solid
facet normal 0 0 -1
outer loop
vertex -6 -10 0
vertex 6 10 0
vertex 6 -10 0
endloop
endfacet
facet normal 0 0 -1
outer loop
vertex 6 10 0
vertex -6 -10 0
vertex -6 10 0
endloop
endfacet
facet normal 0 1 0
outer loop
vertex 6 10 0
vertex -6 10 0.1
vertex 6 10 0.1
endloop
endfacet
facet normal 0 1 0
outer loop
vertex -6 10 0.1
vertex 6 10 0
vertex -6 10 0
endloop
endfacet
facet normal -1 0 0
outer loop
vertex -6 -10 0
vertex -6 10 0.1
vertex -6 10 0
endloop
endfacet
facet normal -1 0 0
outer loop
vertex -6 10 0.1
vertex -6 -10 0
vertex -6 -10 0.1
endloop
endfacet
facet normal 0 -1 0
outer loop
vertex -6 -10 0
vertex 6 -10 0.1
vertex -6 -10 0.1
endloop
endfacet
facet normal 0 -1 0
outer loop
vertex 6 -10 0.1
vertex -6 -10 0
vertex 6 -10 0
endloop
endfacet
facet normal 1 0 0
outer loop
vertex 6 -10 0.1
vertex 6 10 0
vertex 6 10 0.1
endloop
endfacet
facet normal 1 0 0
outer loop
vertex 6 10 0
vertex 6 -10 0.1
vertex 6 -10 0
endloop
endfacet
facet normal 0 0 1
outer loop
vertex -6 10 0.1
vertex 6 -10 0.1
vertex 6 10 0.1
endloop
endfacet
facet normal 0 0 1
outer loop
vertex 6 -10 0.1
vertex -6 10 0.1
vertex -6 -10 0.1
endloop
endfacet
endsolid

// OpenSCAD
// file: ../p/box5-12.scad
use <../lib.scad>
function ldraw_lib__box5_12() = [
// 0 Box with 5 Faces without Any Edges
// 0 Name: box5-12.dat
// 0 Author: Chris Dee [cwdee]
// 0 !LDRAW_ORG Primitive UPDATE 2009-02
// 0 !LICENSE Licensed under CC BY 4.0 : see CAreadme.txt
// 
// 0 BFC CERTIFY CCW
  [0,"BFC","CERTIFY"],
  [0,"BFC","CCW"],
// 
// 0 !HISTORY 2009-09-03 [PTadmin] Official Update 2009-02
// 
// 
// 4 16 1 1 1 1 1 -1 -1 1 -1 -1 1 1
  [4,16,1,1,1,1,1,-1,-1,1,-1,-1,1,1],
// 4 16 -1 0 1 1 0 1 1 1 1 -1 1 1
  [4,16,-1,0,1,1,0,1,1,1,1,-1,1,1],
// 4 16 -1 0 -1 -1 0 1 -1 1 1 -1 1 -1
  [4,16,-1,0,-1,-1,0,1,-1,1,1,-1,1,-1],
// 4 16 1 0 -1 -1 0 -1 -1 1 -1 1 1 -1
  [4,16,1,0,-1,-1,0,-1,-1,1,-1,1,1,-1],
// 4 16 1 0 1 1 0 -1 1 1 -1 1 1 1
  [4,16,1,0,1,1,0,-1,1,1,-1,1,1,1],
// 0
];
module ldraw_lib__box5_12(step=0, col=false, unit=2/5, alt=false, line=0.2, solid=!$preview)
    makepoly(ldraw_lib__box5_12(), step=step, col=col, unit=unit, alt=alt, line=line, solid=solid);
ldraw_lib__box5_12(line=0.2);
// main file
use <../lib.scad>
use <../p/box5-12.scad>
function ldraw_lib__4650854h() = [
// 0 Sticker  2.5 x  1.5 with Chrome Silver Mirror
// 0 Name: 4650854h.dat
// 0 Author: Takeshi Takahashi [RainbowDolphin]
// 0 !LDRAW_ORG Part UPDATE 2024-08
// 0 !LICENSE Licensed under CC BY 4.0 : see CAreadme.txt
// 
// 0 BFC CERTIFY CCW
  [0,"BFC","CERTIFY"],
  [0,"BFC","CCW"],
// 
// 0 !KEYWORDS Bricklink 3185stk01, Brickowl 384632, camp, Rebrickable 10099435
// 0 !KEYWORDS Riding, Set 3185, Stable
// 
// 0 !HISTORY 2024-09-30 [OrionP] Official Update 2024-08
// 
// 
// 1 16 0 -0.25 0 15 0 0 0 0.25 0 0 0 25 box5-12.dat
  [1,16,0,-0.25,0,15,0,0,0,0.25,0,0,0,25, ldraw_lib__box5_12()],
// 
// 4 383 15 -0.25 25 -15 -0.25 25 -15 -0.25 -25 15 -0.25 -25
  [4,383,15,-0.25,25,-15,-0.25,25,-15,-0.25,-25,15,-0.25,-25],
];
module ldraw_lib__4650854h(step=0, col=false, unit=2/5, alt=false, line=0.2, solid=!$preview)
    makepoly(ldraw_lib__4650854h(), step=step, col=col, unit=unit, alt=alt, line=line, solid=solid);
ldraw_lib__4650854h(line=0.2);
